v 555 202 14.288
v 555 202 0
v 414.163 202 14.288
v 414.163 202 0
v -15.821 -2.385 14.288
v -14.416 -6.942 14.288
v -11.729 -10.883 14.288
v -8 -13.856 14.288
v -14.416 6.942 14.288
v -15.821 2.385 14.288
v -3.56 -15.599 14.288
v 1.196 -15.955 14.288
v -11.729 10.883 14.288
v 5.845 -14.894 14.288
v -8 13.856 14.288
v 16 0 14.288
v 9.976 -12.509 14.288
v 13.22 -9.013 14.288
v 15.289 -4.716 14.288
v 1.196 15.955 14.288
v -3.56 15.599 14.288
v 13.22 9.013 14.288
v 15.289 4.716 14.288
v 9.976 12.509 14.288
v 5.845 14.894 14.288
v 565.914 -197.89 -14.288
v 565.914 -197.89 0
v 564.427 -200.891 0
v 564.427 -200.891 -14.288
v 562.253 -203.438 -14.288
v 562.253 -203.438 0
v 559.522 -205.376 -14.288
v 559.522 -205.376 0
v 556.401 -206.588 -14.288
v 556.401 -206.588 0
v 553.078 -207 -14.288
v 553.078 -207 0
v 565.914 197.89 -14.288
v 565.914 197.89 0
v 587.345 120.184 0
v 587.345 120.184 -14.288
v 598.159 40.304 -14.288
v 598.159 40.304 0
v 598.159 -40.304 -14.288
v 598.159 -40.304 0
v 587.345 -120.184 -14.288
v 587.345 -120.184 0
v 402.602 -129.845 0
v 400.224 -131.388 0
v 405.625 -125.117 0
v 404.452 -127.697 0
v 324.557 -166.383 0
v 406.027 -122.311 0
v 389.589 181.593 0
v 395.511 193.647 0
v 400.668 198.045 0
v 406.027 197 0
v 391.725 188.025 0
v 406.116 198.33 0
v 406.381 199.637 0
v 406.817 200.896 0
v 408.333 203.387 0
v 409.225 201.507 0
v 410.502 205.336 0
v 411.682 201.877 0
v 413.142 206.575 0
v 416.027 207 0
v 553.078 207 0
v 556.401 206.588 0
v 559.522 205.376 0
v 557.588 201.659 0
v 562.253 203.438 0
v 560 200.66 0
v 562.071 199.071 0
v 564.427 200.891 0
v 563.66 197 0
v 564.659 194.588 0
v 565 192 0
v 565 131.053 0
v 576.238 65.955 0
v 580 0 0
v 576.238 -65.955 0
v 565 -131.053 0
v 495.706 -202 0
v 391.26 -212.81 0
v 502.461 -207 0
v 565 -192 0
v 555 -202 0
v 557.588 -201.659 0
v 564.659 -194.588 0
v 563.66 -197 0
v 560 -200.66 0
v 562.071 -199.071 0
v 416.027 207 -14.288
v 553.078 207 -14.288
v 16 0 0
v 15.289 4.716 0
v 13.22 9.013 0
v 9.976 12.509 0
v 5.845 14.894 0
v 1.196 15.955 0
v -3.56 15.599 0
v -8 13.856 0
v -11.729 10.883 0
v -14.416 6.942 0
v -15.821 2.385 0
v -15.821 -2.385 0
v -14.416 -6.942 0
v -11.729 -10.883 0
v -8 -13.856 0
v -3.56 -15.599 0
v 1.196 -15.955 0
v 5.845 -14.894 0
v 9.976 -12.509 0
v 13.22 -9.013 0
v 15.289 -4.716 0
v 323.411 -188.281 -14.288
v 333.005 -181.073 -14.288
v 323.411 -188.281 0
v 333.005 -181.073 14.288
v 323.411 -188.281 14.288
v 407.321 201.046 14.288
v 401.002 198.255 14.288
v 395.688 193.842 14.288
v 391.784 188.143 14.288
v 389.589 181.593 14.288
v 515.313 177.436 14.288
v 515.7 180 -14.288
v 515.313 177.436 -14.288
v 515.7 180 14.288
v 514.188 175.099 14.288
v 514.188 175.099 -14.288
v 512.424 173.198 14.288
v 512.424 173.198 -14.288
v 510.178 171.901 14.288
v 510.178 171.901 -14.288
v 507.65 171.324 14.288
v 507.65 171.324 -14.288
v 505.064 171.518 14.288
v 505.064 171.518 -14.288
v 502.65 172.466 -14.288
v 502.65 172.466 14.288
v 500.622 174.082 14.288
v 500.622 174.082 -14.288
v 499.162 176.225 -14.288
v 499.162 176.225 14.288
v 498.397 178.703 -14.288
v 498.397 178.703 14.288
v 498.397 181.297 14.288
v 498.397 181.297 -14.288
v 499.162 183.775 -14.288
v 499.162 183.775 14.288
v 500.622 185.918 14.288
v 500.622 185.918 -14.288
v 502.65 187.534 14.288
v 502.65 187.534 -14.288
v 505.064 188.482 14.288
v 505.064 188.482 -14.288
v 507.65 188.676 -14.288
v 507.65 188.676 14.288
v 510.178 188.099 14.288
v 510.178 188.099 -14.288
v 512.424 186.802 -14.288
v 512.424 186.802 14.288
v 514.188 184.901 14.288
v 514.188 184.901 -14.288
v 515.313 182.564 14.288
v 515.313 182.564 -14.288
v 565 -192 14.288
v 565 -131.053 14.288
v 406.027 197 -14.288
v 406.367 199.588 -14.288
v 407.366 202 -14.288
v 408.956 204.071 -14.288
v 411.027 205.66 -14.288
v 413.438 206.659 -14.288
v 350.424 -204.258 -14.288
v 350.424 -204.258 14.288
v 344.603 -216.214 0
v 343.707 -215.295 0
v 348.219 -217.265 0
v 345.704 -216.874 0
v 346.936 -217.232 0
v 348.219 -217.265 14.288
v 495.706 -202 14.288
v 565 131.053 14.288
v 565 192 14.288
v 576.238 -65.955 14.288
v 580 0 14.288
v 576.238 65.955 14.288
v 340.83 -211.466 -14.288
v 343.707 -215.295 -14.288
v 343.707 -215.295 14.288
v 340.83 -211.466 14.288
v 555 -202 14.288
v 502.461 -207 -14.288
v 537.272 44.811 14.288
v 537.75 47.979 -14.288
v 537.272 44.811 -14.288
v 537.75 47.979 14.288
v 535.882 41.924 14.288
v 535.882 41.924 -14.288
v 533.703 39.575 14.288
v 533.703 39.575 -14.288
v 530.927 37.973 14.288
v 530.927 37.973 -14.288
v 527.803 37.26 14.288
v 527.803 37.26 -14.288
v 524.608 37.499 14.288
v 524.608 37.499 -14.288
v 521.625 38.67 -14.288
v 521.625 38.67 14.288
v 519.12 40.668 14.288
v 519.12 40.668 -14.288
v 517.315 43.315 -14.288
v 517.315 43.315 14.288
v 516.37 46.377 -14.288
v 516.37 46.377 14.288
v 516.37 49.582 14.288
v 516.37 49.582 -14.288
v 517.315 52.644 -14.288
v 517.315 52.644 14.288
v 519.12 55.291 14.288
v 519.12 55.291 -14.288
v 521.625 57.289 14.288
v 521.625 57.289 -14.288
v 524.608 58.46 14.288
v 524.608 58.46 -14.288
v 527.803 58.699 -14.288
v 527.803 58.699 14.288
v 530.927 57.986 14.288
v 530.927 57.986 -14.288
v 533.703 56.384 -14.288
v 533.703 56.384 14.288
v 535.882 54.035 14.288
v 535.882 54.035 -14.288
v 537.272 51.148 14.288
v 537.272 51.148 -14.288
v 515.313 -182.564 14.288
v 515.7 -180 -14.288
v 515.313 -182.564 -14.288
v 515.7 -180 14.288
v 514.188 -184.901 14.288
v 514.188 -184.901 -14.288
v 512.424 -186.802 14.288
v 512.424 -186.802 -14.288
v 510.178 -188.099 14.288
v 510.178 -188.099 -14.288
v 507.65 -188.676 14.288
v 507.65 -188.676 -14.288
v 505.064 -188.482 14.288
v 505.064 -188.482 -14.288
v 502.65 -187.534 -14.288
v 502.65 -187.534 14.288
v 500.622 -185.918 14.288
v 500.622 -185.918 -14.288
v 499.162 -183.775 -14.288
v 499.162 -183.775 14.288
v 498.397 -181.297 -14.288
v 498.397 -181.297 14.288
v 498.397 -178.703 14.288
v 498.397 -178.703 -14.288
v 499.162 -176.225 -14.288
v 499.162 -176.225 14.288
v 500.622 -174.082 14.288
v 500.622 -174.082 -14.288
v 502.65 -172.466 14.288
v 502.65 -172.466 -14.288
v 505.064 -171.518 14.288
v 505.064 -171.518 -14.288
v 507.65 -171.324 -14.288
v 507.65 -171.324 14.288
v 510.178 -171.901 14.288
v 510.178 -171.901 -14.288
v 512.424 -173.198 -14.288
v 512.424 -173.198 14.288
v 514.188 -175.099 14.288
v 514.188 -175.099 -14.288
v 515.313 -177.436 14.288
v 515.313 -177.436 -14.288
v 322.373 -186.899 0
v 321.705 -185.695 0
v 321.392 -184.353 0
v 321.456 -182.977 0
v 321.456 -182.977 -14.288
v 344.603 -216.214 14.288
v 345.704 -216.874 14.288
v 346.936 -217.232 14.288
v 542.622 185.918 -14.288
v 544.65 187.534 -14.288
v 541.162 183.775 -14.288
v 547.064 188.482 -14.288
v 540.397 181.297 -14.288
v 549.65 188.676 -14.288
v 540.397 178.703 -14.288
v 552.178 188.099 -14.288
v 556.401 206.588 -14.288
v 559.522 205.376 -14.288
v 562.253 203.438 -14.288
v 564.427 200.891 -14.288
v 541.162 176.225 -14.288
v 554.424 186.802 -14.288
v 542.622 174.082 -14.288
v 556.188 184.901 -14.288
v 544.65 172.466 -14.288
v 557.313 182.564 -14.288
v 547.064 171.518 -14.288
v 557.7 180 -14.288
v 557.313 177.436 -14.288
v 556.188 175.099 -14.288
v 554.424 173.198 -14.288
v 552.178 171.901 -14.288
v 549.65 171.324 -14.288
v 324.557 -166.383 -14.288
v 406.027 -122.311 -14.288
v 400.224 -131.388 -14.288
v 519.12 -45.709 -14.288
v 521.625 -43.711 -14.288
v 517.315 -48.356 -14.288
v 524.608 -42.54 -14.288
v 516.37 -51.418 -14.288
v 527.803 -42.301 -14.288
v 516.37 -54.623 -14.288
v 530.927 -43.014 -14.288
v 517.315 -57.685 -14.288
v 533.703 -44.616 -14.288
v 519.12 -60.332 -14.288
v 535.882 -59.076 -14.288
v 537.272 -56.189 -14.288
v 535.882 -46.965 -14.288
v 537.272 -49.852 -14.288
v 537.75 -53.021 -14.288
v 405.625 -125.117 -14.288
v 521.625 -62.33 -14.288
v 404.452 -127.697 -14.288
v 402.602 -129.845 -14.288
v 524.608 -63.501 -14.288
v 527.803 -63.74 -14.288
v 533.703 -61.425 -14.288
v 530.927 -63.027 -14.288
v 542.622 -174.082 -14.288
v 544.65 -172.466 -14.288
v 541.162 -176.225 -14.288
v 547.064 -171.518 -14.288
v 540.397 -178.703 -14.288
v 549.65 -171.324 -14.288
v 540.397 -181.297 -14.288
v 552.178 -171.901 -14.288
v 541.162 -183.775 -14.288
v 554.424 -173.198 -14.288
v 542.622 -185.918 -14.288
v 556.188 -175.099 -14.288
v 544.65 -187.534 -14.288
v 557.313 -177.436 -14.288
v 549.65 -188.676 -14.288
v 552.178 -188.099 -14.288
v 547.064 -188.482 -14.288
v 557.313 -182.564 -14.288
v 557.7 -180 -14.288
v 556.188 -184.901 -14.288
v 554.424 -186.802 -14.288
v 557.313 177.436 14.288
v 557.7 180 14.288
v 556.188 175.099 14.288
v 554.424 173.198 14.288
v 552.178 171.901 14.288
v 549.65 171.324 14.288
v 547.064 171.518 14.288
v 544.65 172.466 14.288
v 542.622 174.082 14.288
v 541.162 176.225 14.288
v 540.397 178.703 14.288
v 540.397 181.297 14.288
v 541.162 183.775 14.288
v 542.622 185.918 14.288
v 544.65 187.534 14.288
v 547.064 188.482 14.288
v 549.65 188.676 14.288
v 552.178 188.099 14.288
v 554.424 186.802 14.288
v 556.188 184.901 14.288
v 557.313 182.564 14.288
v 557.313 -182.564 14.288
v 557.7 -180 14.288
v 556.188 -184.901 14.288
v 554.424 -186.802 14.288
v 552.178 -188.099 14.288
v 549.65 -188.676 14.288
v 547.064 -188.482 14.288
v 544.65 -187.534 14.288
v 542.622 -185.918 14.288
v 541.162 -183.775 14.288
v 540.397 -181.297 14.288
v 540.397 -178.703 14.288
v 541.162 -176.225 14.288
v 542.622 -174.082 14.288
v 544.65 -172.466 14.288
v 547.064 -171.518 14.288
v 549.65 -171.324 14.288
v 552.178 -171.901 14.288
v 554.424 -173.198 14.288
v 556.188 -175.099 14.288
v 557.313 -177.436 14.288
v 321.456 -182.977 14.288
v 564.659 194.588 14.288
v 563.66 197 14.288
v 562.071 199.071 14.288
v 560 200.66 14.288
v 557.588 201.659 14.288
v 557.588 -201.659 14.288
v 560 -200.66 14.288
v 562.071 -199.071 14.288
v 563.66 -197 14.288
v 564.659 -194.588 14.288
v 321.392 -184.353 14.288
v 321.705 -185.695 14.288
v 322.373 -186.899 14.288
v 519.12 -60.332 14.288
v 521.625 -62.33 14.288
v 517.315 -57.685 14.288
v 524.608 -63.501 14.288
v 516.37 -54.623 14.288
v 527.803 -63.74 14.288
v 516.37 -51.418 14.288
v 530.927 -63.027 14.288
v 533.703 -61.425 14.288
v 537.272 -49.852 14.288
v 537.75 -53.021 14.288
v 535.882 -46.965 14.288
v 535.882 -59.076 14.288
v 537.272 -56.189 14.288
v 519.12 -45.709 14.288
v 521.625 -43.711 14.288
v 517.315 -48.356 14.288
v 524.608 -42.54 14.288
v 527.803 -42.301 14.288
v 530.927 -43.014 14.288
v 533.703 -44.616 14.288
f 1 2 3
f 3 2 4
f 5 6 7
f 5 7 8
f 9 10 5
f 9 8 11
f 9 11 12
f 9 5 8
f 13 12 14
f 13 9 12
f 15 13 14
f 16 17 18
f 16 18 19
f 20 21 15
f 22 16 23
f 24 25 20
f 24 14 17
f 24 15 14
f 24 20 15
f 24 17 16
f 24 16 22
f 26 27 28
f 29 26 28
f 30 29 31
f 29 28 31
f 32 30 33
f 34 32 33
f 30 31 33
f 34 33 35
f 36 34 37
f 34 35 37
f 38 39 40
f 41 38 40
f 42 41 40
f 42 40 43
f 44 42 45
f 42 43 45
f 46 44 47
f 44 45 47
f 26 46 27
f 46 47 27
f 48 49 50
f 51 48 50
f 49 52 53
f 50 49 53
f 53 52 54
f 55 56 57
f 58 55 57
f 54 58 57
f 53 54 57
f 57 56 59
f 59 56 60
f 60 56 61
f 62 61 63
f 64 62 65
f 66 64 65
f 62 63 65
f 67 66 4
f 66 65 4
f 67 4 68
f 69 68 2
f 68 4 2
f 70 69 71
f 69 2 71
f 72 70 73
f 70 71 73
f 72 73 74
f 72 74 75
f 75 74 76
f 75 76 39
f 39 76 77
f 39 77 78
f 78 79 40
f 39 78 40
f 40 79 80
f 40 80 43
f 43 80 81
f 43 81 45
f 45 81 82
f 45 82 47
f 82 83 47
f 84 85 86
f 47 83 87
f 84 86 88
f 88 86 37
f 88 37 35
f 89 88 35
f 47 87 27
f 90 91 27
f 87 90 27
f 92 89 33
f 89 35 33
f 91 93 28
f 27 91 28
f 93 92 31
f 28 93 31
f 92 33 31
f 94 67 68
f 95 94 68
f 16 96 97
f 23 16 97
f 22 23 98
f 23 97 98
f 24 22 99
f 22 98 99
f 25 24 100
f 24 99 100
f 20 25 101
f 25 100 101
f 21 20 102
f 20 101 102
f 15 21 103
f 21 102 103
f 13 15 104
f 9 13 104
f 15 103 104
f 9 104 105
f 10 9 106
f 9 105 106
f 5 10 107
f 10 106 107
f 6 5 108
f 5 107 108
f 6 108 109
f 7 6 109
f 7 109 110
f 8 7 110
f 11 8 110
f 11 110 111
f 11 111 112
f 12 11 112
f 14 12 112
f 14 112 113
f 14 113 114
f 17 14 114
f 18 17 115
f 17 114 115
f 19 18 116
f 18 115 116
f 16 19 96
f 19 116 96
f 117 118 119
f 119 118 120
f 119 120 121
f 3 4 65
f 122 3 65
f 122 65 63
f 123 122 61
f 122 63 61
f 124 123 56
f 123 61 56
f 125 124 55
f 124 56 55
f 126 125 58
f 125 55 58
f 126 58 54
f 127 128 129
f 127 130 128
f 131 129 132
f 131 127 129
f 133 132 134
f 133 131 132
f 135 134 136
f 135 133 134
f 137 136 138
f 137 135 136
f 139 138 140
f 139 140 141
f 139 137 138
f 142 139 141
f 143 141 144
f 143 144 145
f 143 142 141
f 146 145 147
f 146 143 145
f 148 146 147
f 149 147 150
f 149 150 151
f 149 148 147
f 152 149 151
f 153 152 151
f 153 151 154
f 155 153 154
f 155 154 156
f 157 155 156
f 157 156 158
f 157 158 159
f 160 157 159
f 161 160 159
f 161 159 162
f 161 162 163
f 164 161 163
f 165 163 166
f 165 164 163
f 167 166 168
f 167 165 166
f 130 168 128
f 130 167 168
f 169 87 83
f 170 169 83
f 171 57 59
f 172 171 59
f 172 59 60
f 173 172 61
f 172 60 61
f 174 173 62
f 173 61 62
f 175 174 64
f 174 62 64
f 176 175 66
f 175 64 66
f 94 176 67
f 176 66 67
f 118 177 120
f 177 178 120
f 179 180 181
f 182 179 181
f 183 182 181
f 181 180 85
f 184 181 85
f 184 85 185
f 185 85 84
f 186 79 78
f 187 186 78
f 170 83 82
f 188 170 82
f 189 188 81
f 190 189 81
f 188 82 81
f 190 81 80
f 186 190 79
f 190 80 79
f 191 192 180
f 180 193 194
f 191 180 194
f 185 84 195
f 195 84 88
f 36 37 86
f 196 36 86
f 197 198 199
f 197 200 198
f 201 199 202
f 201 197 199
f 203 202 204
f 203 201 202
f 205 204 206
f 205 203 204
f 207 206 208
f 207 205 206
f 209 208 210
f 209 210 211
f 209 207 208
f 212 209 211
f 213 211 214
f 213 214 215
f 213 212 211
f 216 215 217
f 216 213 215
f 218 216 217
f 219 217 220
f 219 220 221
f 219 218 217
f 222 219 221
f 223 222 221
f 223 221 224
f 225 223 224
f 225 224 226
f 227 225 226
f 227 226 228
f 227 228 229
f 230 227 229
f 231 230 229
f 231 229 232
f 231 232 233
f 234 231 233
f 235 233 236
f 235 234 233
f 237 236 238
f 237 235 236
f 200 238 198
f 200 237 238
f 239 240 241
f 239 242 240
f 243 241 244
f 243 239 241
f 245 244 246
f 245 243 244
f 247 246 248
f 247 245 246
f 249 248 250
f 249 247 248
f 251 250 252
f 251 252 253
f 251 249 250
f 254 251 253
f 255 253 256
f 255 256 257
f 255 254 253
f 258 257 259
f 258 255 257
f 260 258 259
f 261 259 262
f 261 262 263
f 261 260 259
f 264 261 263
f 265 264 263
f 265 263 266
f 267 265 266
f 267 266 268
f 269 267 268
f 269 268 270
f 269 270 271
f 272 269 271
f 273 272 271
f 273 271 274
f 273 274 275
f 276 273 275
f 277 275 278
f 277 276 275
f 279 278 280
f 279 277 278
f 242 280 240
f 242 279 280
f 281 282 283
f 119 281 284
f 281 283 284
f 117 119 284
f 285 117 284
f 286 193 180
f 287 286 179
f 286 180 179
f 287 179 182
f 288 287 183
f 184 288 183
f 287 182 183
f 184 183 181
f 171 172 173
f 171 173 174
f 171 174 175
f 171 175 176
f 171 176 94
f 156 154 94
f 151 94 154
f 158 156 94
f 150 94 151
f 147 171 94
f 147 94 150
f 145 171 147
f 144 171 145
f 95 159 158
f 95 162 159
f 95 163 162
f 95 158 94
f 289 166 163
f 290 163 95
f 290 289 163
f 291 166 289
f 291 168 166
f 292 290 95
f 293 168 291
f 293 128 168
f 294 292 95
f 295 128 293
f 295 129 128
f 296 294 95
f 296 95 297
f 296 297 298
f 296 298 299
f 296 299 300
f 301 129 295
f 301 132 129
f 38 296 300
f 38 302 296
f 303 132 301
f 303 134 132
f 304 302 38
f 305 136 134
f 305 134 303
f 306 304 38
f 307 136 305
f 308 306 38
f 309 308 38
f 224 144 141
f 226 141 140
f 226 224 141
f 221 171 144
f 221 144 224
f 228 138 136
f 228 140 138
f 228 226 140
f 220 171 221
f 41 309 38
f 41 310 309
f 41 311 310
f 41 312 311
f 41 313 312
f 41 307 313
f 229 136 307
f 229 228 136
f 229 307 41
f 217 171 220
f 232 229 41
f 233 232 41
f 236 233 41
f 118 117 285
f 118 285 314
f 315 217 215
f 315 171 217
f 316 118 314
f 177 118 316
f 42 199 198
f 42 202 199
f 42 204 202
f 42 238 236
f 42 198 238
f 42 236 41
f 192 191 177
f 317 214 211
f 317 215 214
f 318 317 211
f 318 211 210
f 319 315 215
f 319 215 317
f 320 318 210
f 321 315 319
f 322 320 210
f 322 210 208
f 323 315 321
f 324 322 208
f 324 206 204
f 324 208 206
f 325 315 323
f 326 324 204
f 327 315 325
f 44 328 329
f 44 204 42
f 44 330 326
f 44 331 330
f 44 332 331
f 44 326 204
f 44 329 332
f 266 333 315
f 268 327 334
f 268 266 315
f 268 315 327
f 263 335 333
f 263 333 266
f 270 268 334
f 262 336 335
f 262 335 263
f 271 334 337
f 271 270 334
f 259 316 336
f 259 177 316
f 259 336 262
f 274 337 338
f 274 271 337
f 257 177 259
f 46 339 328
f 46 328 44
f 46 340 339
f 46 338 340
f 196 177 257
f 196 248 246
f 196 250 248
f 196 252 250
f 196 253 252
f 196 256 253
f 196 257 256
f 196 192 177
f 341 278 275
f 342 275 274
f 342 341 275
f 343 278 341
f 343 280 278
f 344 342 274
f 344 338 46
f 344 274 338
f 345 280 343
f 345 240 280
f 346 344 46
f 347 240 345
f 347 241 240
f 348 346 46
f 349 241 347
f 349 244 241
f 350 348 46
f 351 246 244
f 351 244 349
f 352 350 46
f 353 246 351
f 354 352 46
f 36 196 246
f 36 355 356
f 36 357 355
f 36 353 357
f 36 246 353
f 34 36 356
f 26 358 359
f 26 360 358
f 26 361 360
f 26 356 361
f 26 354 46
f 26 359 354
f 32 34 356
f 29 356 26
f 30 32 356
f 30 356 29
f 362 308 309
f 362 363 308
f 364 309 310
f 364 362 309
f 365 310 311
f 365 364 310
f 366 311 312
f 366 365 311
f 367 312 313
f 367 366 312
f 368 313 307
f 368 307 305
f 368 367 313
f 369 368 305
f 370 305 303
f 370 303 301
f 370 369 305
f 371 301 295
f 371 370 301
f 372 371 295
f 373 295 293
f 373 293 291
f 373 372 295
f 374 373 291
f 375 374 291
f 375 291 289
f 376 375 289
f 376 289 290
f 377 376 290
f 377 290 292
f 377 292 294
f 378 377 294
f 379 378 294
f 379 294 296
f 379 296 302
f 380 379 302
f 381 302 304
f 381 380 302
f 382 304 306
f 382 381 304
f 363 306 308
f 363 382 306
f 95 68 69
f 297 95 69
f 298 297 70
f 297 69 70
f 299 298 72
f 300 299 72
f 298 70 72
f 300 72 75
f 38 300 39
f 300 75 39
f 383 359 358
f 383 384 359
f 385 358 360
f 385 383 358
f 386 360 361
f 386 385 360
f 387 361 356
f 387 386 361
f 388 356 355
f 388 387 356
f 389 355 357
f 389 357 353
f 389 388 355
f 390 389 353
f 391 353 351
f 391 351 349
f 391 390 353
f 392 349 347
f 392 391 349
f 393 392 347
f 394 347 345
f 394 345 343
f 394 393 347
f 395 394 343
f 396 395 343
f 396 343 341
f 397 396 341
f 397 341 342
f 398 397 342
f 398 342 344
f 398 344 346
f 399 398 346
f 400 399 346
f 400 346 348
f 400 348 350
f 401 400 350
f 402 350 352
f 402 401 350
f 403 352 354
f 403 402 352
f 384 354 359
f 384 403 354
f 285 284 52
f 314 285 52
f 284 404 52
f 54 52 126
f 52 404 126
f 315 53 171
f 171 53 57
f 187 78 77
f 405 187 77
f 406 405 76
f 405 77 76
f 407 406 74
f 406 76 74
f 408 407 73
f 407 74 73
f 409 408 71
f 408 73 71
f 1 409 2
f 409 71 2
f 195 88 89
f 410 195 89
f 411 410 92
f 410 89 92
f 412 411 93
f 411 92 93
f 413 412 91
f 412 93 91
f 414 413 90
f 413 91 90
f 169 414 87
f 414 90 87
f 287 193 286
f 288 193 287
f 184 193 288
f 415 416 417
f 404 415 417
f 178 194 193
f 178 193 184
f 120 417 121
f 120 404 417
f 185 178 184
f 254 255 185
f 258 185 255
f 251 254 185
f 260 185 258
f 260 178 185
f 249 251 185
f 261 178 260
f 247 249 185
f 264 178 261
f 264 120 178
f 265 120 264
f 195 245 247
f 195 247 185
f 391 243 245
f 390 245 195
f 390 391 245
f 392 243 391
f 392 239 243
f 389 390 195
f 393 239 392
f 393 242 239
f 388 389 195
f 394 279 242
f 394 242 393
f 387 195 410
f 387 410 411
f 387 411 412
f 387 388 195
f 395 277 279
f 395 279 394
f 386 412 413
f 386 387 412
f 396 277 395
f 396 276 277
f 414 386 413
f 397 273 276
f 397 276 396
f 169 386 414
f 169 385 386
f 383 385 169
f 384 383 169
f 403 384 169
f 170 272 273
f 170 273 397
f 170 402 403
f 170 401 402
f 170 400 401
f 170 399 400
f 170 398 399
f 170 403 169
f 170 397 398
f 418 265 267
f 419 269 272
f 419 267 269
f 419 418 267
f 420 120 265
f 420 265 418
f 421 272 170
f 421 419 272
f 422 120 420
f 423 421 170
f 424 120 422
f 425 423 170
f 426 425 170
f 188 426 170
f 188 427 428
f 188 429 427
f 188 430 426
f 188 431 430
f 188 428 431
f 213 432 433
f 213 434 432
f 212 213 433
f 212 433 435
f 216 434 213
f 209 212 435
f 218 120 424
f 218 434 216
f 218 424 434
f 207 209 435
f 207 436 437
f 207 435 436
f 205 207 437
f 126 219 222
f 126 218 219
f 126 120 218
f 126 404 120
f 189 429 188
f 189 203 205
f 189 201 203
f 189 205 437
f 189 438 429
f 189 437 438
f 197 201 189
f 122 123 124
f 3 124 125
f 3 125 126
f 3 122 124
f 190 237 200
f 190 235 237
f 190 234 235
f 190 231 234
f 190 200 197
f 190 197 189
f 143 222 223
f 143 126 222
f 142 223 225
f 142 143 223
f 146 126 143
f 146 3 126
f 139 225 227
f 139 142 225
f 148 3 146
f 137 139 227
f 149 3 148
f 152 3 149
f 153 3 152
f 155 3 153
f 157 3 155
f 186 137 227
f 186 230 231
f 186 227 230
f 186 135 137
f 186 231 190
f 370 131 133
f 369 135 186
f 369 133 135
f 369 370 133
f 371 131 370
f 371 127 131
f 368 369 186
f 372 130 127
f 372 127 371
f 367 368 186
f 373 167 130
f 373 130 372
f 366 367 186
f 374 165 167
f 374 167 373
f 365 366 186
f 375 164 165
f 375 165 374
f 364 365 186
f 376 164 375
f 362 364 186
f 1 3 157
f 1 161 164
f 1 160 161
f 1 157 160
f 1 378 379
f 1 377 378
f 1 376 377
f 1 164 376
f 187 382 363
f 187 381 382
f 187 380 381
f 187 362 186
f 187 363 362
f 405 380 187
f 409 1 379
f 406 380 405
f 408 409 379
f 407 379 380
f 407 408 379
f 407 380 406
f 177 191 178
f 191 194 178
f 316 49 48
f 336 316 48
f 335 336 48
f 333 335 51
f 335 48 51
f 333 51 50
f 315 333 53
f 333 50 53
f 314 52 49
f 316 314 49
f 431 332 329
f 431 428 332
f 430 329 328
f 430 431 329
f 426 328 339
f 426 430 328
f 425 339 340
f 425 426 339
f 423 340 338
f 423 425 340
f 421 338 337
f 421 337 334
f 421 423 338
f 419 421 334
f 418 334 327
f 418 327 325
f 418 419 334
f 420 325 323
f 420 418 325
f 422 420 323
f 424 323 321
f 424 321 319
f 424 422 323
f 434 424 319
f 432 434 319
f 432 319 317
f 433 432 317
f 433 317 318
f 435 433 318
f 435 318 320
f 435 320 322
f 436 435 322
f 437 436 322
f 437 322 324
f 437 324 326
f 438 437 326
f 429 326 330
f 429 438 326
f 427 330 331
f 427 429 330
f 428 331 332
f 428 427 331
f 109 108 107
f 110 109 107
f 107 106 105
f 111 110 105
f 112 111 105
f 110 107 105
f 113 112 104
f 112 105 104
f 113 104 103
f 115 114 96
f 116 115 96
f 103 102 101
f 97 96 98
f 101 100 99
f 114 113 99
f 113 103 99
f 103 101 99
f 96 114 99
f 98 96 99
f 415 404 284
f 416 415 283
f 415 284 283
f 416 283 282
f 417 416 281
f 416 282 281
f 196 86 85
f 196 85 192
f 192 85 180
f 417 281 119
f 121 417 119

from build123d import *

# Parameters (mm, degrees)
F0_R     = 8.7
F0_R_2   = 10.75
F1_DEPTH = 14.2875
F2_R     = 8.7
F2_R_2   = 10.75
F3_DEPTH = 14.2875
F0_R_3   = 16
F4_DEPTH = 14.2875


# Not quite as in the source:
# - a length typed as a fraction of an inch, garbled in the dataset ("3 / 203.2 mm" for 3/8 in), is restored
# - a feature names something its author has since deleted; it is built from what else it names


with BuildPart() as f1:
    # F0 (on Top) → F1 (new body)
    with BuildSketch(Plane.XY):
        with BuildLine():
            Line((348.2189872385, -217.2652141408), (495.7062776099, -202))
            Line((495.7062776099, -202), (555, -202))
            ThreePointArc((555, -202), (562.0710678119, -199.0710678119), (565, -192))
            Line((565, -192), (565, -131.0534242208))
            ThreePointArc((565, -131.0534242208), (580, 0), (565, 131.0534242208))
            Line((565, 131.0534242208), (565, 192))
            ThreePointArc((565, 192), (562.0710678119, 199.0710678119), (555, 202))
            Line((555, 202), (414.1631860812, 202))
            ThreePointArc((414.1631860812, 202), (398.1915832415, 196.2329899582), (389.5886519187, 181.5926322185))
            Line((389.5886519187, 181.5926322185), (321.4556631787, -182.977483508))
            ThreePointArc((321.4556631787, -182.977483508), (321.501996532, -185.0348656396), (322.3730600039, -186.8993270748))
            Line((322.3730600039, -186.8993270748), (323.410873951, -188.2806902374))
            Line((323.410873951, -188.2806902374), (333.0048979686, -181.0727291422))
            Line((333.0048979686, -181.0727291422), (350.4241372821, -204.2582871847))
            Line((350.4241372821, -204.2582871847), (340.8301132645, -211.4662482799))
            Line((340.8301132645, -211.4662482799), (343.7067176257, -215.2950995966))
            ThreePointArc((343.7067176257, -215.2950995966), (345.7035463941, -216.8740607913), (348.2189872385, -217.2652141408))
        make_face()
        with Locations((507, -180)):
            Circle(F0_R, mode=Mode.SUBTRACT)
        with Locations((549, -180)):
            Circle(F0_R, mode=Mode.SUBTRACT)
        with Locations((527, -53.020531197)):
            Circle(F0_R_2, mode=Mode.SUBTRACT)
        with Locations((527, 47.979468803)):
            Circle(F0_R_2, mode=Mode.SUBTRACT)
        with Locations((507, 180)):
            Circle(F0_R, mode=Mode.SUBTRACT)
        with Locations((549, 180)):
            Circle(F0_R, mode=Mode.SUBTRACT)
    extrude(amount=F1_DEPTH)

    # F2 (on face) → F3 (join)
    with BuildSketch(Plane(origin=(0, 0, 0), x_dir=(1, 0, 0), z_dir=(0, 0, -1))):
        with BuildLine():
            Line((416.0266704213, -207), (553.0775391075, -207))
            ThreePointArc((553.0775391075, -207), (560.9475314042, -204.4911597734), (565.9135130702, -197.8903958685))
            ThreePointArc((565.9135130702, -197.8903958685), (599.5153985116, 0), (565.9135130702, 197.8903958685))
            ThreePointArc((565.9135130702, 197.8903958685), (560.9475314042, 204.4911597734), (553.0775391075, 207))
            Line((553.0775391075, 207), (502.4613982964, 207))
            Line((502.4613982964, 207), (343.7067176257, 215.2950995966))
            Line((343.7067176257, 215.2950995966), (340.8301132645, 211.4662482799))
            Line((340.8301132645, 211.4662482799), (350.4241372821, 204.2582871847))
            Line((350.4241372821, 204.2582871847), (333.0048979686, 181.0727291422))
            Line((333.0048979686, 181.0727291422), (323.410873951, 188.2806902374))
            Line((323.410873951, 188.2806902374), (321.4556631787, 182.977483508))
            Line((321.4556631787, 182.977483508), (324.5568533725, 166.3834475094))
            Line((324.5568533725, 166.3834475094), (400.2244110781, 131.3875502719))
            ThreePointArc((400.2244110781, 131.3875502719), (404.4521498311, 127.6974775298), (406.0266704213, 122.3112639511))
            Line((406.0266704213, 122.3112639511), (406.0266704213, -197))
            ThreePointArc((406.0266704213, -197), (408.9556026095, -204.0710678119), (416.0266704213, -207))
        make_face()
        with Locations((507, -180)):
            Circle(F2_R, mode=Mode.SUBTRACT)
        with Locations((549, -180)):
            Circle(F2_R, mode=Mode.SUBTRACT)
        with Locations((527, -47.979468803)):
            Circle(F2_R_2, mode=Mode.SUBTRACT)
        with Locations((527, 53.020531197)):
            Circle(F2_R_2, mode=Mode.SUBTRACT)
        with Locations((507, 180)):
            Circle(F2_R, mode=Mode.SUBTRACT)
        with Locations((549, 180)):
            Circle(F2_R, mode=Mode.SUBTRACT)
    extrude(amount=F3_DEPTH)


with BuildPart() as f4:
    # F0 (on Top) → F4 (new body)
    with BuildSketch(Plane.XY):
        Circle(F0_R_3)
    extrude(amount=F4_DEPTH)


solid = Compound([f1.part, f4.part])
